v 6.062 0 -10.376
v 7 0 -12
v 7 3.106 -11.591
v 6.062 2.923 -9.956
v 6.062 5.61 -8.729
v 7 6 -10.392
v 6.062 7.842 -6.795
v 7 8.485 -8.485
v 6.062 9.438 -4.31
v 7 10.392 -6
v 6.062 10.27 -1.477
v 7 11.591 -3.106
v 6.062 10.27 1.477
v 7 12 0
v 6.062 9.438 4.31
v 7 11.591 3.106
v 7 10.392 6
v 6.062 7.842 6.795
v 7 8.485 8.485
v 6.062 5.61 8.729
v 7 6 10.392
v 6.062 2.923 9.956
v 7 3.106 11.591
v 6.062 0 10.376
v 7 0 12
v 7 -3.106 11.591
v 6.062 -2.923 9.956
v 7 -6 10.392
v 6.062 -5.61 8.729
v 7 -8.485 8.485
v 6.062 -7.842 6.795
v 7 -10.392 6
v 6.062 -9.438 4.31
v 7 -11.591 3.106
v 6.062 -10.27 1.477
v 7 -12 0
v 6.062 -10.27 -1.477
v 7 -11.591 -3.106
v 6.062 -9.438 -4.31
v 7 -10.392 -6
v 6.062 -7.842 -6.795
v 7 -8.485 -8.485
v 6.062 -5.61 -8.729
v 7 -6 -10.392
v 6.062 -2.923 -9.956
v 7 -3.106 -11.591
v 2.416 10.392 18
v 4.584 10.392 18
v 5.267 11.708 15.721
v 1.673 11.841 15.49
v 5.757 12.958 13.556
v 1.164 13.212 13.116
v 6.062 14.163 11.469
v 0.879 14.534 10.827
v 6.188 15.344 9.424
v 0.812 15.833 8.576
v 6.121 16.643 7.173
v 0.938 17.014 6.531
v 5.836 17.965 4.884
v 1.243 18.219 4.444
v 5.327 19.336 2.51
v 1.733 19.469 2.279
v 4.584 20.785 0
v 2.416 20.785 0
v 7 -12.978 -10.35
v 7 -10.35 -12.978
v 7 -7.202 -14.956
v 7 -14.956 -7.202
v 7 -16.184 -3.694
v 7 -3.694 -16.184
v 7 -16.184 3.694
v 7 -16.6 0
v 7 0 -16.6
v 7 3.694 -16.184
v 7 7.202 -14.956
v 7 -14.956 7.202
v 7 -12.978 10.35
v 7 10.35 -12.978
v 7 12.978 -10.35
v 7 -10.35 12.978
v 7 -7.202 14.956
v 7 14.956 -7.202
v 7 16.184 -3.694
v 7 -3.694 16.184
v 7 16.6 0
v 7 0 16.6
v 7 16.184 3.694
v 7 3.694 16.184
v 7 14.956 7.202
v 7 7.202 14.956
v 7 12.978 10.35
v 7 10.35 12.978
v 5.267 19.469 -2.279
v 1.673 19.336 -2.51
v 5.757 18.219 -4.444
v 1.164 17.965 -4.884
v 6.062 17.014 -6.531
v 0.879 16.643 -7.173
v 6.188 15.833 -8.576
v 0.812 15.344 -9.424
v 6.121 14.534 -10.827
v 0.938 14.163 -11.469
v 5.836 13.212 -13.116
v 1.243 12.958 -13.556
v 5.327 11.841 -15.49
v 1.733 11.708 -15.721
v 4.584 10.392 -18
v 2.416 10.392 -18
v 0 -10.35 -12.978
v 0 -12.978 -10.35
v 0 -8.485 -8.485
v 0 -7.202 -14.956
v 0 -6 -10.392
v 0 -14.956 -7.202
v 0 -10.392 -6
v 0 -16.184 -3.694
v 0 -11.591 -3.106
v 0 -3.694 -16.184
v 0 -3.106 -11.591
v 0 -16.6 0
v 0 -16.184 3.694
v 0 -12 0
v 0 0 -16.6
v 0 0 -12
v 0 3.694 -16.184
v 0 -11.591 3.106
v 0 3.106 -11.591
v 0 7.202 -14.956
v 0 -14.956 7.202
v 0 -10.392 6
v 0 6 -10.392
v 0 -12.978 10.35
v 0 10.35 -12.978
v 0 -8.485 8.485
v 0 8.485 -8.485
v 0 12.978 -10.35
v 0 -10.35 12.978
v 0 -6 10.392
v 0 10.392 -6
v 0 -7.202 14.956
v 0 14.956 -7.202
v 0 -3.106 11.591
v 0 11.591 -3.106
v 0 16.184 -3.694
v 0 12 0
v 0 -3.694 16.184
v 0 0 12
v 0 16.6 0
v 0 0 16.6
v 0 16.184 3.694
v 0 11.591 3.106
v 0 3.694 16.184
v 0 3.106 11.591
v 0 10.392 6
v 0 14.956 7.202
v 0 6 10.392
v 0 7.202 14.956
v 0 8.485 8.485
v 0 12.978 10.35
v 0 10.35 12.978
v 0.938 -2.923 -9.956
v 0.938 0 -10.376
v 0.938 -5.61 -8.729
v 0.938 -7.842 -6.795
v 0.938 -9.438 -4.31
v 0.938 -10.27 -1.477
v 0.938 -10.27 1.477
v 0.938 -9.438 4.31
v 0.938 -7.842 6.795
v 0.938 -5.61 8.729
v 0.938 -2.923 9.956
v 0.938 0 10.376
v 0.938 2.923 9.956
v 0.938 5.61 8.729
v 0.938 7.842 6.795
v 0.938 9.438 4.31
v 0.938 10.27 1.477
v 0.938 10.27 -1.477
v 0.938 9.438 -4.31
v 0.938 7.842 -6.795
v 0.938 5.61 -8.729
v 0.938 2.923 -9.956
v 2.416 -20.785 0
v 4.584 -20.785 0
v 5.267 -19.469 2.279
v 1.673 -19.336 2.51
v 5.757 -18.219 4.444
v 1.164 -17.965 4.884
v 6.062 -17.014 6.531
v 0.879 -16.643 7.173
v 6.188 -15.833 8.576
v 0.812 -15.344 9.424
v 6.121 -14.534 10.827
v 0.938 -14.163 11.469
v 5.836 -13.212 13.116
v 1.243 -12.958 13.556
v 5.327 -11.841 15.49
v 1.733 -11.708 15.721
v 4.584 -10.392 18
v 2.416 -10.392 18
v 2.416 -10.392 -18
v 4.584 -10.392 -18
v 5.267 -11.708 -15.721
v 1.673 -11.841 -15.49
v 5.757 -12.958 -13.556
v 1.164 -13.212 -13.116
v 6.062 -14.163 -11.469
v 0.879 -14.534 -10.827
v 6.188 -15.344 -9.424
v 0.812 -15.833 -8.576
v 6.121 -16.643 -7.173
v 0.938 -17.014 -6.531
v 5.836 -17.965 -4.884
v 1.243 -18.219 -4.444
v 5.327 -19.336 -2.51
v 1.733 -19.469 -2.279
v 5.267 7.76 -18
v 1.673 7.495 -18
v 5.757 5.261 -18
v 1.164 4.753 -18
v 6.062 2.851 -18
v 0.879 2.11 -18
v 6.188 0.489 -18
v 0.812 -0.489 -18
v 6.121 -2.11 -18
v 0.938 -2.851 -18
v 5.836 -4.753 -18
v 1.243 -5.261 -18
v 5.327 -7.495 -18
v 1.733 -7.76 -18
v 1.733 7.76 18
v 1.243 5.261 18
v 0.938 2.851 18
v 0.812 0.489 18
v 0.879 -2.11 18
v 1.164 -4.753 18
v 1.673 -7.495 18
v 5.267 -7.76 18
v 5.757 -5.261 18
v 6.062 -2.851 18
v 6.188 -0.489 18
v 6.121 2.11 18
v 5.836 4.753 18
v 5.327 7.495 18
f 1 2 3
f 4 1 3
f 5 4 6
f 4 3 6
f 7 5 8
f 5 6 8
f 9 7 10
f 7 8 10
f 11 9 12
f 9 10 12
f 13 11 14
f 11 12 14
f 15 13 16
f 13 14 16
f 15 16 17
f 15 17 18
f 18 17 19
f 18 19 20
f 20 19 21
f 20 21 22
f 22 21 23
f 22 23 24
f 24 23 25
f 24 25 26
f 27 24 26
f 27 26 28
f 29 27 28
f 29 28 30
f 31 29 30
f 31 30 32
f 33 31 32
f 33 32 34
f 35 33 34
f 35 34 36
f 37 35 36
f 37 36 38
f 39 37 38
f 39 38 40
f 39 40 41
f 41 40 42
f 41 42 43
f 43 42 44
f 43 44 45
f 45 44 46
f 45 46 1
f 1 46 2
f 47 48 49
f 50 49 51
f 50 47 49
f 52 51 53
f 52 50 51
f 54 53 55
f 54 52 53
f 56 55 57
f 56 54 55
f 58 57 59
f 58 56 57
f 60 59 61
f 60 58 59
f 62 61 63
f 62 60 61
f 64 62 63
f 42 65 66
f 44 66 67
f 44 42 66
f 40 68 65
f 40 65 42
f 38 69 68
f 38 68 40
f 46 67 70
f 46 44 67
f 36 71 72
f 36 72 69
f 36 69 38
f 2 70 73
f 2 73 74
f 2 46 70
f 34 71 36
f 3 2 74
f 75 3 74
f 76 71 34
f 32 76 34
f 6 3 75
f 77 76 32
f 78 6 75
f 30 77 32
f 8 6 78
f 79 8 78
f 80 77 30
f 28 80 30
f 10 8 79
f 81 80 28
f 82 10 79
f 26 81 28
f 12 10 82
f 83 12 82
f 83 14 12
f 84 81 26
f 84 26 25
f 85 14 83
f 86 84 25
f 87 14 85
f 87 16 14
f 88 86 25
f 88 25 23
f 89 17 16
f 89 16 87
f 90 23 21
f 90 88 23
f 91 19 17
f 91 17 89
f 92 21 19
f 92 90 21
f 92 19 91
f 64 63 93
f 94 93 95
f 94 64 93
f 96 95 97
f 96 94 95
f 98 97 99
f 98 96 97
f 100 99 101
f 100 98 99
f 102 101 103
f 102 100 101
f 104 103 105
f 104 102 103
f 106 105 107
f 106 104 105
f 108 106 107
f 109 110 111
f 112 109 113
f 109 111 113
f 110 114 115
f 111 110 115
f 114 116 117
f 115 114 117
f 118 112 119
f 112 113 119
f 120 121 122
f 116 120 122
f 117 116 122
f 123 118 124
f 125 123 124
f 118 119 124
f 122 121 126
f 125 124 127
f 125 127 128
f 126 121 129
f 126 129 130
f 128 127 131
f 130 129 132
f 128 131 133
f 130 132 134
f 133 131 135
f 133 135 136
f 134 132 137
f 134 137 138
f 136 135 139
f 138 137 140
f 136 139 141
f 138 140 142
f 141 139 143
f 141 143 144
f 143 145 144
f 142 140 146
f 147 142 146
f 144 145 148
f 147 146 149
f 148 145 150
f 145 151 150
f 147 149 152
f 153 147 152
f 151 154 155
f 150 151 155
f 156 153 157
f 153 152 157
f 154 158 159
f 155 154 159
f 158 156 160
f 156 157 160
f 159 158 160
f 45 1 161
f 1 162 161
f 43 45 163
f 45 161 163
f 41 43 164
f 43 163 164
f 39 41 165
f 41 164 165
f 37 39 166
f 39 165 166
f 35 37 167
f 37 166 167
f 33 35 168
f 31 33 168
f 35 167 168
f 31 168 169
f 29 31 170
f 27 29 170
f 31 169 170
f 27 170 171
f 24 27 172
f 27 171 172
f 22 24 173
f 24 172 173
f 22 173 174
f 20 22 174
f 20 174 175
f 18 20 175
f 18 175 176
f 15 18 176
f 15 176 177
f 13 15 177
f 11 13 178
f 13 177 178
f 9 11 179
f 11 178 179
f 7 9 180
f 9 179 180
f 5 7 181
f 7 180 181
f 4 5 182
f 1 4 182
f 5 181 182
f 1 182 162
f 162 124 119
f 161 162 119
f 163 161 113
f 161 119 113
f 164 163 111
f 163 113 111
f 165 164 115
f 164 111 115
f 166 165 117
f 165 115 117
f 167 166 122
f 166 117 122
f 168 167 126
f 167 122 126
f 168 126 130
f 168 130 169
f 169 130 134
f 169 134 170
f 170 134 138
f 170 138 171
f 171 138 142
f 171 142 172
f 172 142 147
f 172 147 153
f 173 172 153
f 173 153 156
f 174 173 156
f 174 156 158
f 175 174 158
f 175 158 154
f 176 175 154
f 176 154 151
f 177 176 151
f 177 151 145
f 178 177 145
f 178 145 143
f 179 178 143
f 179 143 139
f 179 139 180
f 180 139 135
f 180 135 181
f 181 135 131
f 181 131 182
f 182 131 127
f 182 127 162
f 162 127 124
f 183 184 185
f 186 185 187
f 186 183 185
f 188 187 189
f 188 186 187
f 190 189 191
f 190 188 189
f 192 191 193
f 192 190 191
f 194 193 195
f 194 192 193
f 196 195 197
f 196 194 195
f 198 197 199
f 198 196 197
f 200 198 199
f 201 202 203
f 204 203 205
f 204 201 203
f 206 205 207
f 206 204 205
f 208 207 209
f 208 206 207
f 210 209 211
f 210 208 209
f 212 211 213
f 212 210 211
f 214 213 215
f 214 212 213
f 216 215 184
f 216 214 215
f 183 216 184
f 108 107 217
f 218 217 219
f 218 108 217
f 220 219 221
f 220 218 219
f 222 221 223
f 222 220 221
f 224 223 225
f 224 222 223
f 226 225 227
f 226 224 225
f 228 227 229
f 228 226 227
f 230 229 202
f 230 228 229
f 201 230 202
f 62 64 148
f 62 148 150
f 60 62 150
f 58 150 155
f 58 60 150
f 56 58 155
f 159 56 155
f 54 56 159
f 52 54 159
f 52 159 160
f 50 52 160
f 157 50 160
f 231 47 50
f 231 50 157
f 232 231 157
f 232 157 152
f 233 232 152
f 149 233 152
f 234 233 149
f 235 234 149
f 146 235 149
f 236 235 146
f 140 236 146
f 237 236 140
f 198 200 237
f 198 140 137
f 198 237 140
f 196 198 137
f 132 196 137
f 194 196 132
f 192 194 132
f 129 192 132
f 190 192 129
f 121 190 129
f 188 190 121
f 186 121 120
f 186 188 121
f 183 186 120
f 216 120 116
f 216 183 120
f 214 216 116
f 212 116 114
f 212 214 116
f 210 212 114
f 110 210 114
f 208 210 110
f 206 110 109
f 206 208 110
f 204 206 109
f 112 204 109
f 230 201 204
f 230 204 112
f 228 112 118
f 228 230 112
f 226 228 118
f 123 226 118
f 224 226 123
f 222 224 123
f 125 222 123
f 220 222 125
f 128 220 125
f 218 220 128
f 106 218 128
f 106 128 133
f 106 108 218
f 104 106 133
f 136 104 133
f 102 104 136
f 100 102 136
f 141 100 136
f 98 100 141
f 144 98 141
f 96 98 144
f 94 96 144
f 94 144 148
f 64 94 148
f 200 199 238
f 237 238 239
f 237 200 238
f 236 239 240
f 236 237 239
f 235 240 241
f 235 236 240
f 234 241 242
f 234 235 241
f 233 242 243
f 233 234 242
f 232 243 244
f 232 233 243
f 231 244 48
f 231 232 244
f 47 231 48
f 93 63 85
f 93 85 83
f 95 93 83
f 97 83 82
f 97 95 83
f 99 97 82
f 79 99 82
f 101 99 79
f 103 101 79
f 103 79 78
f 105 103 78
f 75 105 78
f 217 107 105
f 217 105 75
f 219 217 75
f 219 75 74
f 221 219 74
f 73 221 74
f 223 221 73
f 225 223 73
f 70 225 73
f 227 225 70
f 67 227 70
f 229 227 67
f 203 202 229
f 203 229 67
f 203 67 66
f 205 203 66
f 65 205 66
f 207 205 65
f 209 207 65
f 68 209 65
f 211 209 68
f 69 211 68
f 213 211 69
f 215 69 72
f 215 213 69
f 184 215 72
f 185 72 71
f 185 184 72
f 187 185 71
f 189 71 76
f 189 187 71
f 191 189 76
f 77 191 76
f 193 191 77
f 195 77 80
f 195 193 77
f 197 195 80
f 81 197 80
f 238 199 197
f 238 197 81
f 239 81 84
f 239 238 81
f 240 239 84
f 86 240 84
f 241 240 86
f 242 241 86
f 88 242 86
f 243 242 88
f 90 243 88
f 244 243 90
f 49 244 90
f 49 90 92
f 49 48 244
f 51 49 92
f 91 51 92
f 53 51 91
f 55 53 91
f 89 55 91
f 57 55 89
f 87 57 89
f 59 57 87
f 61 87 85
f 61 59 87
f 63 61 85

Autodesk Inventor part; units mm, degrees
ref_plane "YZ Plane" through (0, 0, 0) normal (1, 0, 0) x (0, 1, 0)
ref_plane "XZ Plane" through (0, 0, 0) normal (0, 1, 0) x (-1, 0, 0)
sketch "Sketch1" plane through (0, 0, 0) normal (1, 0, 0) x (0, 1, 0)
  line L0 (-20.7846, 0) -> (-10.3923, 18)
  line L1 (-10.3923, 18) -> (10.3923, 18)
  line L2 (10.3923, 18) -> (20.7846, 0)
  line L3 (20.7846, 0) -> (10.3923, -18)
  line L4 (10.3923, -18) -> (-10.3923, -18)
  line L5 (-10.3923, -18) -> (-20.7846, 0)
  point P0 (0, 0)
  point P1 (0, 0)
  dimension "d0" = 41.5692
extrude "Body" add sketch "Sketch1" along normal blind 7
sketch "Sketch2" plane through (0, 0, 0) normal (0, 0, 1) x (1, 0, 0)
  line L0 (0, 10.3923) -> (0, 20.7846) projected
  line L1 (0, 20.7846) -> (7, 20.7846) projected
  line L2 (7, 10.3923) -> (7, 20.7846) projected
  line L3 (-2.4, 0) -> (14.4, 0) projected
  line L4 (2.416, 20.7846) -> (0, 16.6)
  line L5 (4.584, 20.7846) -> (7, 16.6)
  dimension "d3" = 30
  dimension "d4" = 30
  dimension "d5" = 33.2
  dimension "d6" = 33.2
revolve "Chamfer1" cut sketch "Sketch2" angle 360 about axis through (-10, 0, 0) along (1, 0, 0)
sketch "Sketch3" plane through (7, 0, 0) normal (1, 0, 0) x (0, 0, -1)
  arc A0 (-0.625, -1.0825) -> (0.625, -1.0825) centre (0, 0) ccw projected
hole "Thread" at (7, 0, 0) direction (-1, 0, 0) diameter 20.752 end through all thread size "M24x3" class "6H" standard "ISO Metric profile"
chamfer "Chamfer2" distance 1.6238 angle 30 1 edges at (7, 0, 10.376) measured on face at (7, 14.3393, -1.7411)
chamfer "Chamfer3" distance 1.6238 angle 30 1 edges at (0, 0, 10.376) measured on face at (0, 14.3393, -1.7411)
ref_plane "Work Plane1" through (-48.5942, 0, 0) normal (0, -0.866, -0.5) x (1, 0, 0)
equation "\"d0\" = 1.1547 * SW"
equation "\"d3\" = ANG1"
equation "\"d4\" = ANG2"
equation "\"d5\" = SW0"
equation "\"d6\" = SW01"
equation "\"d8\" = -0.5 * GD1 + 0.5 * NND"
equation "\"d40\" = -0.5 * GD1 + 0.5 * NND"
equation "\"d10\" = -0.5 * GD1 + 0.5 * NND"
equation "\"d41\" = -0.5 * GD1 + 0.5 * NND"
equation "\"ANG1\" = 30deg"
equation "\"ANG2\" = 30deg"
equation "\"NND\" = 24"
equation "\"KOH\" = 12"
equation "\"SW\" = 36"
equation "\"SW0\" = 33.2"
equation "\"SW01\" = SW0"
equation "\"GUL\" = 0.541266 * PTC"
equation "\"THREADDIA\" = 24"
equation "\"TOA\" = 30deg"
equation "\"PTC\" = 3"
equation "\"E0\" = 1.155 * SW"
equation "\"GAL\" = 0.541266 * PTC"
equation "\"GD1\" = 20.752405"
properties part number "PWTR-0062" material "Stainless Steel, 440C"
